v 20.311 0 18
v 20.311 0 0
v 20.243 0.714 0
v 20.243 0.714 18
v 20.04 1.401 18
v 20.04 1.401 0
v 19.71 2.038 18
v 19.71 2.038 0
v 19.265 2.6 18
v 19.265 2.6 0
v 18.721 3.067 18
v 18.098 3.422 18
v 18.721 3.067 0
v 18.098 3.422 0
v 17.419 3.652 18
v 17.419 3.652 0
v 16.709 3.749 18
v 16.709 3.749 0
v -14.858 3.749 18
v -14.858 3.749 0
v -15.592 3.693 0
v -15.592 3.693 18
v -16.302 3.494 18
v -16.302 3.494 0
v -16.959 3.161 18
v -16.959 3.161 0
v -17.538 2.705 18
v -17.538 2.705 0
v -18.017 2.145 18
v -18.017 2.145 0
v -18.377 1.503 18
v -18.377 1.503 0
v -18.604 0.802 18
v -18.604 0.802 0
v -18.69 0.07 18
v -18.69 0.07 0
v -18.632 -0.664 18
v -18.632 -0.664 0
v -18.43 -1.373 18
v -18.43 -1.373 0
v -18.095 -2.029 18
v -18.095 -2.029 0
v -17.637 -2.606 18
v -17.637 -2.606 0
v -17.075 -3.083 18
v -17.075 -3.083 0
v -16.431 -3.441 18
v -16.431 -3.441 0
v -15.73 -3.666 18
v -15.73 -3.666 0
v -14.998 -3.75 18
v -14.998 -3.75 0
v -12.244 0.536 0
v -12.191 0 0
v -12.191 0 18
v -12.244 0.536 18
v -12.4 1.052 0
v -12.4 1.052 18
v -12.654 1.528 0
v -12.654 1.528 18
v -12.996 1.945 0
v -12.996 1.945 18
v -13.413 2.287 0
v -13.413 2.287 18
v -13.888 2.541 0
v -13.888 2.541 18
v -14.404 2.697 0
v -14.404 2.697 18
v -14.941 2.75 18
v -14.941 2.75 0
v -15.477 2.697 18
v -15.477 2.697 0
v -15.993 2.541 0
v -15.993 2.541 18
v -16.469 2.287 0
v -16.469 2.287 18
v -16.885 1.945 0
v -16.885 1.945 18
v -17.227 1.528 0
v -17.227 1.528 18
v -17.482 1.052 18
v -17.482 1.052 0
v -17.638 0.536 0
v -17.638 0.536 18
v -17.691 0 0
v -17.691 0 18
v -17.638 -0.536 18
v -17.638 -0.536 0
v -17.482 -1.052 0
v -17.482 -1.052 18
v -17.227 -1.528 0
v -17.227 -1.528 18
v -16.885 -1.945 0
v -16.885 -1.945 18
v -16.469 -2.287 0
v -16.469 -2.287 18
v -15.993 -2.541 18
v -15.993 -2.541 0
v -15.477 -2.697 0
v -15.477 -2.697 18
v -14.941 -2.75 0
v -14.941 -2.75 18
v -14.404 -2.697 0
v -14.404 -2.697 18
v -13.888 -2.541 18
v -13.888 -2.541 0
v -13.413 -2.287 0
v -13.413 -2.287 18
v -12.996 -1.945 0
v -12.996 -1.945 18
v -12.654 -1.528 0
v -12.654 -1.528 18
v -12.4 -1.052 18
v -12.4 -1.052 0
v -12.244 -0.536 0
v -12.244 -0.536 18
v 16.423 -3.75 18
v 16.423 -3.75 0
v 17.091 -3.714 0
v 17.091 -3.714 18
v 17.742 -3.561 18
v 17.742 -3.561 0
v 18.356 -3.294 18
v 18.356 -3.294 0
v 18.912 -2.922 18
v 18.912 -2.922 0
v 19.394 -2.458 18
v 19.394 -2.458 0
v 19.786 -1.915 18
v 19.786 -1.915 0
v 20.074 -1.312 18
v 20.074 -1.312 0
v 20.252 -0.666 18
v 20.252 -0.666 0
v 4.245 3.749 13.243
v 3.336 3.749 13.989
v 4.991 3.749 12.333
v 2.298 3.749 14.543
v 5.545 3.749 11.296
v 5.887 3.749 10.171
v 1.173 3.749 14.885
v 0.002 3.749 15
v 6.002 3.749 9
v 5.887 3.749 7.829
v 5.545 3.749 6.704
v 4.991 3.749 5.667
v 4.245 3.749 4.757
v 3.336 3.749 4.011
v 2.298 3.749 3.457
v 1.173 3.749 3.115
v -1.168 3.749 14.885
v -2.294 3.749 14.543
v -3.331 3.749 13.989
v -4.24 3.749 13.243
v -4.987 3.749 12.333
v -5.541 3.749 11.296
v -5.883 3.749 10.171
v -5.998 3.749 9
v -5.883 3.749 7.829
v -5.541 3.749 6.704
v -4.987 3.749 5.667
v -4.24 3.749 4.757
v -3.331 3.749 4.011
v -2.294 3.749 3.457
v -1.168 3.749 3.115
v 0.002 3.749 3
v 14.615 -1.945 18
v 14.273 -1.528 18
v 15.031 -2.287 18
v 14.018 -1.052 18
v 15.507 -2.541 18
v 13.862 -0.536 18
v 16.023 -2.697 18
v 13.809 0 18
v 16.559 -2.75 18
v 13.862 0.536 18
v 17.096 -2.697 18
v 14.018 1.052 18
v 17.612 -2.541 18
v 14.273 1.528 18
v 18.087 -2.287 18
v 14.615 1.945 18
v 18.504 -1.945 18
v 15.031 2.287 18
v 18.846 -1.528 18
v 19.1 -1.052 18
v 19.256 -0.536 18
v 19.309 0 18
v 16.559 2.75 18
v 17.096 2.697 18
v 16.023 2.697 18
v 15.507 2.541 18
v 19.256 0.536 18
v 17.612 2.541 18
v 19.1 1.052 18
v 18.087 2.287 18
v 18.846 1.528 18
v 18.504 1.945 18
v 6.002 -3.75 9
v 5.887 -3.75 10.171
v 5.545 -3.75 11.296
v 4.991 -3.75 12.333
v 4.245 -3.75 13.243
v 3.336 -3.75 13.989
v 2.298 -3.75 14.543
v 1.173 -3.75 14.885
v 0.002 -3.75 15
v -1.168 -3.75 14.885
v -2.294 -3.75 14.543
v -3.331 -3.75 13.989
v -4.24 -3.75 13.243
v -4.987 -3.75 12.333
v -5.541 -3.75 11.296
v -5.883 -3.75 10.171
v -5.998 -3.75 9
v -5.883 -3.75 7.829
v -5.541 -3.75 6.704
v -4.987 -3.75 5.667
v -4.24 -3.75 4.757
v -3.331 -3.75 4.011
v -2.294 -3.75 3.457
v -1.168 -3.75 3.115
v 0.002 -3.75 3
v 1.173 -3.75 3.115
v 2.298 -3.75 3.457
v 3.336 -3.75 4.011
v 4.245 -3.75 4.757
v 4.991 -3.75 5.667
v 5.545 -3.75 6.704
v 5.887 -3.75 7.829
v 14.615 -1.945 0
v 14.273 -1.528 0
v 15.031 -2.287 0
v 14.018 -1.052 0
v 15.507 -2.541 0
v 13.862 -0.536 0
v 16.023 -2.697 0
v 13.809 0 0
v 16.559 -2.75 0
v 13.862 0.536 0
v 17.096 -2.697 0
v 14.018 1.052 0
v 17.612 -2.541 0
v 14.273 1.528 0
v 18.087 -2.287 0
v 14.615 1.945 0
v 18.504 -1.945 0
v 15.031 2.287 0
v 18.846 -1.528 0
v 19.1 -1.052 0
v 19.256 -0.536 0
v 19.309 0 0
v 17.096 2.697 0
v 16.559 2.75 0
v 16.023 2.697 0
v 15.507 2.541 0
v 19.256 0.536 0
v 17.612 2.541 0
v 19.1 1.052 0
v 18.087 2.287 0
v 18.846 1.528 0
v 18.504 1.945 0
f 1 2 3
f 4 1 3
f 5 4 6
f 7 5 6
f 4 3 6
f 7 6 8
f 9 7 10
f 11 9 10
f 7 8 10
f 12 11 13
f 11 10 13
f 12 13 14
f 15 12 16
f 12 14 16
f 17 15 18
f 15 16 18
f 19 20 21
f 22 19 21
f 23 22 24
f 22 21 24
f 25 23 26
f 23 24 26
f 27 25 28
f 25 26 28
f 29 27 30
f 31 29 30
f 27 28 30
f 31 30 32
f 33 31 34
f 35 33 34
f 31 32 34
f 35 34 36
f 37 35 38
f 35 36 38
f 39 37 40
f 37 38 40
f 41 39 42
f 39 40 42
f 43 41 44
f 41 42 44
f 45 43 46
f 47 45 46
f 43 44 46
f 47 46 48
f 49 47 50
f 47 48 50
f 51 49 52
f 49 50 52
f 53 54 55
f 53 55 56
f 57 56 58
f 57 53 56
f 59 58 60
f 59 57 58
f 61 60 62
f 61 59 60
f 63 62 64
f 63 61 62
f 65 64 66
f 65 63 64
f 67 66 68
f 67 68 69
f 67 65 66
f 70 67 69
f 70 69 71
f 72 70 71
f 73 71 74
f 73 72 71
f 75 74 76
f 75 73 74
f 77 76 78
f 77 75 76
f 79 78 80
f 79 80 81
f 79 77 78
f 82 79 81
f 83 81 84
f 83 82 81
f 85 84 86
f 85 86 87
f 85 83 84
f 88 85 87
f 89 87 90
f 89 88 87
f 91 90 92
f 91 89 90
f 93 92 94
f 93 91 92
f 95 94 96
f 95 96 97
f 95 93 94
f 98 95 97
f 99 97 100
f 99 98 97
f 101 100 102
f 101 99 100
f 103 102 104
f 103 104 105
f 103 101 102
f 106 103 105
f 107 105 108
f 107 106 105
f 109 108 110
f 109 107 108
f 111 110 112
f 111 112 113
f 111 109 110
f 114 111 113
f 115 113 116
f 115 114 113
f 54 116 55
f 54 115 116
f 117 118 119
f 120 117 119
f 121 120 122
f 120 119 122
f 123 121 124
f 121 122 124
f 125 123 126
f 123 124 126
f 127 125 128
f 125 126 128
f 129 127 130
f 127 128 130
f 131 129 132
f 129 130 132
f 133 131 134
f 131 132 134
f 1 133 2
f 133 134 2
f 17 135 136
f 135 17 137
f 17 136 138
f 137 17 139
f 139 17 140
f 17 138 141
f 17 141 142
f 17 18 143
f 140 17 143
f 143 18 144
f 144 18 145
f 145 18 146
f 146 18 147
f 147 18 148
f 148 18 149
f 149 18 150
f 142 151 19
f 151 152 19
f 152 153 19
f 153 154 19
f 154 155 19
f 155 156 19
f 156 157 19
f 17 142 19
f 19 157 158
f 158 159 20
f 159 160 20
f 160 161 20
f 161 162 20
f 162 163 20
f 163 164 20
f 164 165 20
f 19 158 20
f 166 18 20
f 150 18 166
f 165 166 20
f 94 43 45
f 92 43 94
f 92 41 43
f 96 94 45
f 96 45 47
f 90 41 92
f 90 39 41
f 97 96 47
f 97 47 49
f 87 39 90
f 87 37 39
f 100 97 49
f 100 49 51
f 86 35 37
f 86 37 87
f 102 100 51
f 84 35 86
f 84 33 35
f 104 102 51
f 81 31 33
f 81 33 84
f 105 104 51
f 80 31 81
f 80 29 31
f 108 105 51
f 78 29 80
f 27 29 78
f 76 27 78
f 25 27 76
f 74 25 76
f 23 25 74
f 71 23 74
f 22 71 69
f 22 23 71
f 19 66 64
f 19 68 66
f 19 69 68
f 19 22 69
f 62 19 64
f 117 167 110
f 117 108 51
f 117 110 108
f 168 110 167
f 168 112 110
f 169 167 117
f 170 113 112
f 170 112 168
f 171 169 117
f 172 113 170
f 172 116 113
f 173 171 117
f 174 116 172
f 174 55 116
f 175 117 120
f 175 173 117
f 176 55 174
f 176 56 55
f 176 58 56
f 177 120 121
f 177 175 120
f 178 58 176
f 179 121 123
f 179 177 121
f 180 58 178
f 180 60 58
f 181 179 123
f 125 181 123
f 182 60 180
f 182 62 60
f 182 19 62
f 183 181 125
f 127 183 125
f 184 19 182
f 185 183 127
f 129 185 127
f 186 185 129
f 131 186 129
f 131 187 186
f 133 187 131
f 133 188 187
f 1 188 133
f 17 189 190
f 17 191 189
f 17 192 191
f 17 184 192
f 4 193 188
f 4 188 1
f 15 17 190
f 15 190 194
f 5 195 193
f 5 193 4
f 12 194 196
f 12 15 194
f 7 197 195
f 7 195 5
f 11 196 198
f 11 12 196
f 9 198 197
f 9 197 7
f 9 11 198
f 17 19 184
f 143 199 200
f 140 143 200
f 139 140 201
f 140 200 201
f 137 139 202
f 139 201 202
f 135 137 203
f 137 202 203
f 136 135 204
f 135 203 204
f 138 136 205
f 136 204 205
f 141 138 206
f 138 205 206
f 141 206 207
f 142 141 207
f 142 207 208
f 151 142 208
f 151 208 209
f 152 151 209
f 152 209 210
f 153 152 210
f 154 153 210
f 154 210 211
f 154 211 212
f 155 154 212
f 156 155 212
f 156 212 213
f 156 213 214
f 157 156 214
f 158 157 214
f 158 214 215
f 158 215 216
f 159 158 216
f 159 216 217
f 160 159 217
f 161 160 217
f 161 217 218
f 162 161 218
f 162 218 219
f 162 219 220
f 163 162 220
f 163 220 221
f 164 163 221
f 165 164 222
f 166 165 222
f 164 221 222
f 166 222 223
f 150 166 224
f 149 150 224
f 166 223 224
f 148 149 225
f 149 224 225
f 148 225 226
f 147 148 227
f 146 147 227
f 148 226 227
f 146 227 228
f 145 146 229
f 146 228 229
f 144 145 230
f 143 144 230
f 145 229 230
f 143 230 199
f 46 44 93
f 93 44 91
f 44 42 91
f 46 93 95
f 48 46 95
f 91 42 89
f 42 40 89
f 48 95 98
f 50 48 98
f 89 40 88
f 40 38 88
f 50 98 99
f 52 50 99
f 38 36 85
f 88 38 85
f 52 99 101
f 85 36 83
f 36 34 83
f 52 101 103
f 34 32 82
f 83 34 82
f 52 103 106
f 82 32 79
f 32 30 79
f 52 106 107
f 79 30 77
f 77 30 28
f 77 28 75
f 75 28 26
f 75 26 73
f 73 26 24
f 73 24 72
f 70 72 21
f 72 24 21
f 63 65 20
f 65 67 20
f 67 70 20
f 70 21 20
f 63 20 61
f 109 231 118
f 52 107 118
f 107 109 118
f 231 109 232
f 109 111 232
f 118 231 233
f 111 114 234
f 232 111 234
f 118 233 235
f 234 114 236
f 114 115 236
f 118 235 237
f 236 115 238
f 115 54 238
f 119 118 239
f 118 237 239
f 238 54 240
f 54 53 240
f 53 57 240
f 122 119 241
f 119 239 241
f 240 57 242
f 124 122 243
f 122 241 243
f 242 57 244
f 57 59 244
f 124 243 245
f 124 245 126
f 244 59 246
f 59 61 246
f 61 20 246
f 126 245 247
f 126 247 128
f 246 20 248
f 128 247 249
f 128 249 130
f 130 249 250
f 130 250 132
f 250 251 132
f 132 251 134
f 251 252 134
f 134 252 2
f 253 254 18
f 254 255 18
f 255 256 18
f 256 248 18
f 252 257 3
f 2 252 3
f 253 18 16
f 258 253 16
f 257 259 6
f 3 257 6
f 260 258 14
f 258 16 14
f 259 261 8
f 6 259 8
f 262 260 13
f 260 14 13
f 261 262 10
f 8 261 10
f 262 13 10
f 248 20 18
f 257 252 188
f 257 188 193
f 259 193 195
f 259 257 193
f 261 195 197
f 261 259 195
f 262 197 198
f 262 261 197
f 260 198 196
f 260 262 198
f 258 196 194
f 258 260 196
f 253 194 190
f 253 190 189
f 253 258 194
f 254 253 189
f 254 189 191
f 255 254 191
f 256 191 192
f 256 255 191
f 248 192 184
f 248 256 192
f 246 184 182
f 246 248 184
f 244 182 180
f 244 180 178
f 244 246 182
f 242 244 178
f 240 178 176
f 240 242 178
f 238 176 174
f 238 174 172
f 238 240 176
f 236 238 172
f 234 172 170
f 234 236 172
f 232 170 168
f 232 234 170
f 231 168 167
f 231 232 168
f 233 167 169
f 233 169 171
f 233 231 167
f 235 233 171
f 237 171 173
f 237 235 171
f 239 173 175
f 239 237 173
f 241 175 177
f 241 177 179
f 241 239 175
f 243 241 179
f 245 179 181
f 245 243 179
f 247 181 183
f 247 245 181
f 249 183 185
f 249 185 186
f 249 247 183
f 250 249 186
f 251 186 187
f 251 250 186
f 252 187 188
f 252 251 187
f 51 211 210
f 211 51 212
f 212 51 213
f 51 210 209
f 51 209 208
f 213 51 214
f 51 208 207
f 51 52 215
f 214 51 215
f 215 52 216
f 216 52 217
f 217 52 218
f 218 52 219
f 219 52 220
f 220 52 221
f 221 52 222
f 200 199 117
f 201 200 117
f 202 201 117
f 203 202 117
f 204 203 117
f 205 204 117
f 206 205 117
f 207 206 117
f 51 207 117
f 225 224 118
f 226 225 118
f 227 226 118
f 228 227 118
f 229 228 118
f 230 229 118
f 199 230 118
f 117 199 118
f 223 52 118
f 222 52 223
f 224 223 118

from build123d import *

# Parameters (mm, degrees)
F0_R     = 2.75
F1_DEPTH = 18
F2_R     = 6
F3_DEPTH = 7.5005674408


# Not quite as in the source:
# - a feature names something its author has since deleted; it is built from what else it names


with BuildPart() as f1:
    # F0 (on Top) → F1 (new body)
    with BuildSketch(Plane.XY):
        with BuildLine():
            ThreePointArc((-14.8575540239, 3.74907491), (-12.2599082251, 2.6220374098), (-11.1908445954, 0))
            Line((-11.1908445954, 0), (12.8071008226, 0))
            ThreePointArc((12.8071008226, 0), (13.8537114507, 2.599708945), (16.4096532115, 3.74907491))
            Line((16.4096532115, 3.74907491), (-14.8575540239, 3.74907491))
        make_face()
        with BuildLine():
            ThreePointArc((-14.8838884093, -3.7495674408), (-12.269133, -2.6314363285), (-11.1908445954, 0))
            ThreePointArc((-11.1908445954, 0), (-12.2599082251, 2.6220374098), (-14.8575540239, 3.74907491))
            ThreePointArc((-14.8575540239, 3.74907491), (-18.6901888916, 0.0701238113), (-14.9978007816, -3.7495674408))
            Line((-14.9978007816, -3.7495674408), (-14.8838884093, -3.7495674408))
        make_face()
        with Locations((-14.9408445954, 0)):
            Circle(F0_R, mode=Mode.SUBTRACT)
        with BuildLine():
            ThreePointArc((16.4096532115, 3.74907491), (13.8537114507, 2.599708945), (12.8071008226, 0))
            ThreePointArc((12.8071008226, 0), (13.858191018, -2.60436268), (16.4225626025, -3.7495674408))
            ThreePointArc((16.4225626025, -3.7495674408), (19.1635180845, -2.7009643866), (20.3112099866, 0))
            ThreePointArc((20.3112099866, 0), (19.2645993584, 2.599708945), (16.7086575976, 3.74907491))
            Line((16.7086575976, 3.74907491), (16.4096532115, 3.74907491))
        make_face()
        with Locations((16.5591554046, 0)):
            Circle(F0_R, mode=Mode.SUBTRACT)
        with BuildLine():
            Line((12.8071008226, 0), (-11.1908445954, 0))
            ThreePointArc((-11.1908445954, 0), (-12.269133, -2.6314363285), (-14.8838884093, -3.7495674408))
            Line((-14.8838884093, -3.7495674408), (16.4225626025, -3.7495674408))
            ThreePointArc((16.4225626025, -3.7495674408), (13.858191018, -2.60436268), (12.8071008226, 0))
        make_face()
    extrude(amount=F1_DEPTH)

    # F2 (on face) → F3 (cut, through all)
    with BuildSketch(Plane.XZ.offset(3.7495674408)):
        with Locations((0.0021992184, 9)):
            Circle(F2_R)
    extrude(amount=-F3_DEPTH, mode=Mode.SUBTRACT)


solid = f1.part
